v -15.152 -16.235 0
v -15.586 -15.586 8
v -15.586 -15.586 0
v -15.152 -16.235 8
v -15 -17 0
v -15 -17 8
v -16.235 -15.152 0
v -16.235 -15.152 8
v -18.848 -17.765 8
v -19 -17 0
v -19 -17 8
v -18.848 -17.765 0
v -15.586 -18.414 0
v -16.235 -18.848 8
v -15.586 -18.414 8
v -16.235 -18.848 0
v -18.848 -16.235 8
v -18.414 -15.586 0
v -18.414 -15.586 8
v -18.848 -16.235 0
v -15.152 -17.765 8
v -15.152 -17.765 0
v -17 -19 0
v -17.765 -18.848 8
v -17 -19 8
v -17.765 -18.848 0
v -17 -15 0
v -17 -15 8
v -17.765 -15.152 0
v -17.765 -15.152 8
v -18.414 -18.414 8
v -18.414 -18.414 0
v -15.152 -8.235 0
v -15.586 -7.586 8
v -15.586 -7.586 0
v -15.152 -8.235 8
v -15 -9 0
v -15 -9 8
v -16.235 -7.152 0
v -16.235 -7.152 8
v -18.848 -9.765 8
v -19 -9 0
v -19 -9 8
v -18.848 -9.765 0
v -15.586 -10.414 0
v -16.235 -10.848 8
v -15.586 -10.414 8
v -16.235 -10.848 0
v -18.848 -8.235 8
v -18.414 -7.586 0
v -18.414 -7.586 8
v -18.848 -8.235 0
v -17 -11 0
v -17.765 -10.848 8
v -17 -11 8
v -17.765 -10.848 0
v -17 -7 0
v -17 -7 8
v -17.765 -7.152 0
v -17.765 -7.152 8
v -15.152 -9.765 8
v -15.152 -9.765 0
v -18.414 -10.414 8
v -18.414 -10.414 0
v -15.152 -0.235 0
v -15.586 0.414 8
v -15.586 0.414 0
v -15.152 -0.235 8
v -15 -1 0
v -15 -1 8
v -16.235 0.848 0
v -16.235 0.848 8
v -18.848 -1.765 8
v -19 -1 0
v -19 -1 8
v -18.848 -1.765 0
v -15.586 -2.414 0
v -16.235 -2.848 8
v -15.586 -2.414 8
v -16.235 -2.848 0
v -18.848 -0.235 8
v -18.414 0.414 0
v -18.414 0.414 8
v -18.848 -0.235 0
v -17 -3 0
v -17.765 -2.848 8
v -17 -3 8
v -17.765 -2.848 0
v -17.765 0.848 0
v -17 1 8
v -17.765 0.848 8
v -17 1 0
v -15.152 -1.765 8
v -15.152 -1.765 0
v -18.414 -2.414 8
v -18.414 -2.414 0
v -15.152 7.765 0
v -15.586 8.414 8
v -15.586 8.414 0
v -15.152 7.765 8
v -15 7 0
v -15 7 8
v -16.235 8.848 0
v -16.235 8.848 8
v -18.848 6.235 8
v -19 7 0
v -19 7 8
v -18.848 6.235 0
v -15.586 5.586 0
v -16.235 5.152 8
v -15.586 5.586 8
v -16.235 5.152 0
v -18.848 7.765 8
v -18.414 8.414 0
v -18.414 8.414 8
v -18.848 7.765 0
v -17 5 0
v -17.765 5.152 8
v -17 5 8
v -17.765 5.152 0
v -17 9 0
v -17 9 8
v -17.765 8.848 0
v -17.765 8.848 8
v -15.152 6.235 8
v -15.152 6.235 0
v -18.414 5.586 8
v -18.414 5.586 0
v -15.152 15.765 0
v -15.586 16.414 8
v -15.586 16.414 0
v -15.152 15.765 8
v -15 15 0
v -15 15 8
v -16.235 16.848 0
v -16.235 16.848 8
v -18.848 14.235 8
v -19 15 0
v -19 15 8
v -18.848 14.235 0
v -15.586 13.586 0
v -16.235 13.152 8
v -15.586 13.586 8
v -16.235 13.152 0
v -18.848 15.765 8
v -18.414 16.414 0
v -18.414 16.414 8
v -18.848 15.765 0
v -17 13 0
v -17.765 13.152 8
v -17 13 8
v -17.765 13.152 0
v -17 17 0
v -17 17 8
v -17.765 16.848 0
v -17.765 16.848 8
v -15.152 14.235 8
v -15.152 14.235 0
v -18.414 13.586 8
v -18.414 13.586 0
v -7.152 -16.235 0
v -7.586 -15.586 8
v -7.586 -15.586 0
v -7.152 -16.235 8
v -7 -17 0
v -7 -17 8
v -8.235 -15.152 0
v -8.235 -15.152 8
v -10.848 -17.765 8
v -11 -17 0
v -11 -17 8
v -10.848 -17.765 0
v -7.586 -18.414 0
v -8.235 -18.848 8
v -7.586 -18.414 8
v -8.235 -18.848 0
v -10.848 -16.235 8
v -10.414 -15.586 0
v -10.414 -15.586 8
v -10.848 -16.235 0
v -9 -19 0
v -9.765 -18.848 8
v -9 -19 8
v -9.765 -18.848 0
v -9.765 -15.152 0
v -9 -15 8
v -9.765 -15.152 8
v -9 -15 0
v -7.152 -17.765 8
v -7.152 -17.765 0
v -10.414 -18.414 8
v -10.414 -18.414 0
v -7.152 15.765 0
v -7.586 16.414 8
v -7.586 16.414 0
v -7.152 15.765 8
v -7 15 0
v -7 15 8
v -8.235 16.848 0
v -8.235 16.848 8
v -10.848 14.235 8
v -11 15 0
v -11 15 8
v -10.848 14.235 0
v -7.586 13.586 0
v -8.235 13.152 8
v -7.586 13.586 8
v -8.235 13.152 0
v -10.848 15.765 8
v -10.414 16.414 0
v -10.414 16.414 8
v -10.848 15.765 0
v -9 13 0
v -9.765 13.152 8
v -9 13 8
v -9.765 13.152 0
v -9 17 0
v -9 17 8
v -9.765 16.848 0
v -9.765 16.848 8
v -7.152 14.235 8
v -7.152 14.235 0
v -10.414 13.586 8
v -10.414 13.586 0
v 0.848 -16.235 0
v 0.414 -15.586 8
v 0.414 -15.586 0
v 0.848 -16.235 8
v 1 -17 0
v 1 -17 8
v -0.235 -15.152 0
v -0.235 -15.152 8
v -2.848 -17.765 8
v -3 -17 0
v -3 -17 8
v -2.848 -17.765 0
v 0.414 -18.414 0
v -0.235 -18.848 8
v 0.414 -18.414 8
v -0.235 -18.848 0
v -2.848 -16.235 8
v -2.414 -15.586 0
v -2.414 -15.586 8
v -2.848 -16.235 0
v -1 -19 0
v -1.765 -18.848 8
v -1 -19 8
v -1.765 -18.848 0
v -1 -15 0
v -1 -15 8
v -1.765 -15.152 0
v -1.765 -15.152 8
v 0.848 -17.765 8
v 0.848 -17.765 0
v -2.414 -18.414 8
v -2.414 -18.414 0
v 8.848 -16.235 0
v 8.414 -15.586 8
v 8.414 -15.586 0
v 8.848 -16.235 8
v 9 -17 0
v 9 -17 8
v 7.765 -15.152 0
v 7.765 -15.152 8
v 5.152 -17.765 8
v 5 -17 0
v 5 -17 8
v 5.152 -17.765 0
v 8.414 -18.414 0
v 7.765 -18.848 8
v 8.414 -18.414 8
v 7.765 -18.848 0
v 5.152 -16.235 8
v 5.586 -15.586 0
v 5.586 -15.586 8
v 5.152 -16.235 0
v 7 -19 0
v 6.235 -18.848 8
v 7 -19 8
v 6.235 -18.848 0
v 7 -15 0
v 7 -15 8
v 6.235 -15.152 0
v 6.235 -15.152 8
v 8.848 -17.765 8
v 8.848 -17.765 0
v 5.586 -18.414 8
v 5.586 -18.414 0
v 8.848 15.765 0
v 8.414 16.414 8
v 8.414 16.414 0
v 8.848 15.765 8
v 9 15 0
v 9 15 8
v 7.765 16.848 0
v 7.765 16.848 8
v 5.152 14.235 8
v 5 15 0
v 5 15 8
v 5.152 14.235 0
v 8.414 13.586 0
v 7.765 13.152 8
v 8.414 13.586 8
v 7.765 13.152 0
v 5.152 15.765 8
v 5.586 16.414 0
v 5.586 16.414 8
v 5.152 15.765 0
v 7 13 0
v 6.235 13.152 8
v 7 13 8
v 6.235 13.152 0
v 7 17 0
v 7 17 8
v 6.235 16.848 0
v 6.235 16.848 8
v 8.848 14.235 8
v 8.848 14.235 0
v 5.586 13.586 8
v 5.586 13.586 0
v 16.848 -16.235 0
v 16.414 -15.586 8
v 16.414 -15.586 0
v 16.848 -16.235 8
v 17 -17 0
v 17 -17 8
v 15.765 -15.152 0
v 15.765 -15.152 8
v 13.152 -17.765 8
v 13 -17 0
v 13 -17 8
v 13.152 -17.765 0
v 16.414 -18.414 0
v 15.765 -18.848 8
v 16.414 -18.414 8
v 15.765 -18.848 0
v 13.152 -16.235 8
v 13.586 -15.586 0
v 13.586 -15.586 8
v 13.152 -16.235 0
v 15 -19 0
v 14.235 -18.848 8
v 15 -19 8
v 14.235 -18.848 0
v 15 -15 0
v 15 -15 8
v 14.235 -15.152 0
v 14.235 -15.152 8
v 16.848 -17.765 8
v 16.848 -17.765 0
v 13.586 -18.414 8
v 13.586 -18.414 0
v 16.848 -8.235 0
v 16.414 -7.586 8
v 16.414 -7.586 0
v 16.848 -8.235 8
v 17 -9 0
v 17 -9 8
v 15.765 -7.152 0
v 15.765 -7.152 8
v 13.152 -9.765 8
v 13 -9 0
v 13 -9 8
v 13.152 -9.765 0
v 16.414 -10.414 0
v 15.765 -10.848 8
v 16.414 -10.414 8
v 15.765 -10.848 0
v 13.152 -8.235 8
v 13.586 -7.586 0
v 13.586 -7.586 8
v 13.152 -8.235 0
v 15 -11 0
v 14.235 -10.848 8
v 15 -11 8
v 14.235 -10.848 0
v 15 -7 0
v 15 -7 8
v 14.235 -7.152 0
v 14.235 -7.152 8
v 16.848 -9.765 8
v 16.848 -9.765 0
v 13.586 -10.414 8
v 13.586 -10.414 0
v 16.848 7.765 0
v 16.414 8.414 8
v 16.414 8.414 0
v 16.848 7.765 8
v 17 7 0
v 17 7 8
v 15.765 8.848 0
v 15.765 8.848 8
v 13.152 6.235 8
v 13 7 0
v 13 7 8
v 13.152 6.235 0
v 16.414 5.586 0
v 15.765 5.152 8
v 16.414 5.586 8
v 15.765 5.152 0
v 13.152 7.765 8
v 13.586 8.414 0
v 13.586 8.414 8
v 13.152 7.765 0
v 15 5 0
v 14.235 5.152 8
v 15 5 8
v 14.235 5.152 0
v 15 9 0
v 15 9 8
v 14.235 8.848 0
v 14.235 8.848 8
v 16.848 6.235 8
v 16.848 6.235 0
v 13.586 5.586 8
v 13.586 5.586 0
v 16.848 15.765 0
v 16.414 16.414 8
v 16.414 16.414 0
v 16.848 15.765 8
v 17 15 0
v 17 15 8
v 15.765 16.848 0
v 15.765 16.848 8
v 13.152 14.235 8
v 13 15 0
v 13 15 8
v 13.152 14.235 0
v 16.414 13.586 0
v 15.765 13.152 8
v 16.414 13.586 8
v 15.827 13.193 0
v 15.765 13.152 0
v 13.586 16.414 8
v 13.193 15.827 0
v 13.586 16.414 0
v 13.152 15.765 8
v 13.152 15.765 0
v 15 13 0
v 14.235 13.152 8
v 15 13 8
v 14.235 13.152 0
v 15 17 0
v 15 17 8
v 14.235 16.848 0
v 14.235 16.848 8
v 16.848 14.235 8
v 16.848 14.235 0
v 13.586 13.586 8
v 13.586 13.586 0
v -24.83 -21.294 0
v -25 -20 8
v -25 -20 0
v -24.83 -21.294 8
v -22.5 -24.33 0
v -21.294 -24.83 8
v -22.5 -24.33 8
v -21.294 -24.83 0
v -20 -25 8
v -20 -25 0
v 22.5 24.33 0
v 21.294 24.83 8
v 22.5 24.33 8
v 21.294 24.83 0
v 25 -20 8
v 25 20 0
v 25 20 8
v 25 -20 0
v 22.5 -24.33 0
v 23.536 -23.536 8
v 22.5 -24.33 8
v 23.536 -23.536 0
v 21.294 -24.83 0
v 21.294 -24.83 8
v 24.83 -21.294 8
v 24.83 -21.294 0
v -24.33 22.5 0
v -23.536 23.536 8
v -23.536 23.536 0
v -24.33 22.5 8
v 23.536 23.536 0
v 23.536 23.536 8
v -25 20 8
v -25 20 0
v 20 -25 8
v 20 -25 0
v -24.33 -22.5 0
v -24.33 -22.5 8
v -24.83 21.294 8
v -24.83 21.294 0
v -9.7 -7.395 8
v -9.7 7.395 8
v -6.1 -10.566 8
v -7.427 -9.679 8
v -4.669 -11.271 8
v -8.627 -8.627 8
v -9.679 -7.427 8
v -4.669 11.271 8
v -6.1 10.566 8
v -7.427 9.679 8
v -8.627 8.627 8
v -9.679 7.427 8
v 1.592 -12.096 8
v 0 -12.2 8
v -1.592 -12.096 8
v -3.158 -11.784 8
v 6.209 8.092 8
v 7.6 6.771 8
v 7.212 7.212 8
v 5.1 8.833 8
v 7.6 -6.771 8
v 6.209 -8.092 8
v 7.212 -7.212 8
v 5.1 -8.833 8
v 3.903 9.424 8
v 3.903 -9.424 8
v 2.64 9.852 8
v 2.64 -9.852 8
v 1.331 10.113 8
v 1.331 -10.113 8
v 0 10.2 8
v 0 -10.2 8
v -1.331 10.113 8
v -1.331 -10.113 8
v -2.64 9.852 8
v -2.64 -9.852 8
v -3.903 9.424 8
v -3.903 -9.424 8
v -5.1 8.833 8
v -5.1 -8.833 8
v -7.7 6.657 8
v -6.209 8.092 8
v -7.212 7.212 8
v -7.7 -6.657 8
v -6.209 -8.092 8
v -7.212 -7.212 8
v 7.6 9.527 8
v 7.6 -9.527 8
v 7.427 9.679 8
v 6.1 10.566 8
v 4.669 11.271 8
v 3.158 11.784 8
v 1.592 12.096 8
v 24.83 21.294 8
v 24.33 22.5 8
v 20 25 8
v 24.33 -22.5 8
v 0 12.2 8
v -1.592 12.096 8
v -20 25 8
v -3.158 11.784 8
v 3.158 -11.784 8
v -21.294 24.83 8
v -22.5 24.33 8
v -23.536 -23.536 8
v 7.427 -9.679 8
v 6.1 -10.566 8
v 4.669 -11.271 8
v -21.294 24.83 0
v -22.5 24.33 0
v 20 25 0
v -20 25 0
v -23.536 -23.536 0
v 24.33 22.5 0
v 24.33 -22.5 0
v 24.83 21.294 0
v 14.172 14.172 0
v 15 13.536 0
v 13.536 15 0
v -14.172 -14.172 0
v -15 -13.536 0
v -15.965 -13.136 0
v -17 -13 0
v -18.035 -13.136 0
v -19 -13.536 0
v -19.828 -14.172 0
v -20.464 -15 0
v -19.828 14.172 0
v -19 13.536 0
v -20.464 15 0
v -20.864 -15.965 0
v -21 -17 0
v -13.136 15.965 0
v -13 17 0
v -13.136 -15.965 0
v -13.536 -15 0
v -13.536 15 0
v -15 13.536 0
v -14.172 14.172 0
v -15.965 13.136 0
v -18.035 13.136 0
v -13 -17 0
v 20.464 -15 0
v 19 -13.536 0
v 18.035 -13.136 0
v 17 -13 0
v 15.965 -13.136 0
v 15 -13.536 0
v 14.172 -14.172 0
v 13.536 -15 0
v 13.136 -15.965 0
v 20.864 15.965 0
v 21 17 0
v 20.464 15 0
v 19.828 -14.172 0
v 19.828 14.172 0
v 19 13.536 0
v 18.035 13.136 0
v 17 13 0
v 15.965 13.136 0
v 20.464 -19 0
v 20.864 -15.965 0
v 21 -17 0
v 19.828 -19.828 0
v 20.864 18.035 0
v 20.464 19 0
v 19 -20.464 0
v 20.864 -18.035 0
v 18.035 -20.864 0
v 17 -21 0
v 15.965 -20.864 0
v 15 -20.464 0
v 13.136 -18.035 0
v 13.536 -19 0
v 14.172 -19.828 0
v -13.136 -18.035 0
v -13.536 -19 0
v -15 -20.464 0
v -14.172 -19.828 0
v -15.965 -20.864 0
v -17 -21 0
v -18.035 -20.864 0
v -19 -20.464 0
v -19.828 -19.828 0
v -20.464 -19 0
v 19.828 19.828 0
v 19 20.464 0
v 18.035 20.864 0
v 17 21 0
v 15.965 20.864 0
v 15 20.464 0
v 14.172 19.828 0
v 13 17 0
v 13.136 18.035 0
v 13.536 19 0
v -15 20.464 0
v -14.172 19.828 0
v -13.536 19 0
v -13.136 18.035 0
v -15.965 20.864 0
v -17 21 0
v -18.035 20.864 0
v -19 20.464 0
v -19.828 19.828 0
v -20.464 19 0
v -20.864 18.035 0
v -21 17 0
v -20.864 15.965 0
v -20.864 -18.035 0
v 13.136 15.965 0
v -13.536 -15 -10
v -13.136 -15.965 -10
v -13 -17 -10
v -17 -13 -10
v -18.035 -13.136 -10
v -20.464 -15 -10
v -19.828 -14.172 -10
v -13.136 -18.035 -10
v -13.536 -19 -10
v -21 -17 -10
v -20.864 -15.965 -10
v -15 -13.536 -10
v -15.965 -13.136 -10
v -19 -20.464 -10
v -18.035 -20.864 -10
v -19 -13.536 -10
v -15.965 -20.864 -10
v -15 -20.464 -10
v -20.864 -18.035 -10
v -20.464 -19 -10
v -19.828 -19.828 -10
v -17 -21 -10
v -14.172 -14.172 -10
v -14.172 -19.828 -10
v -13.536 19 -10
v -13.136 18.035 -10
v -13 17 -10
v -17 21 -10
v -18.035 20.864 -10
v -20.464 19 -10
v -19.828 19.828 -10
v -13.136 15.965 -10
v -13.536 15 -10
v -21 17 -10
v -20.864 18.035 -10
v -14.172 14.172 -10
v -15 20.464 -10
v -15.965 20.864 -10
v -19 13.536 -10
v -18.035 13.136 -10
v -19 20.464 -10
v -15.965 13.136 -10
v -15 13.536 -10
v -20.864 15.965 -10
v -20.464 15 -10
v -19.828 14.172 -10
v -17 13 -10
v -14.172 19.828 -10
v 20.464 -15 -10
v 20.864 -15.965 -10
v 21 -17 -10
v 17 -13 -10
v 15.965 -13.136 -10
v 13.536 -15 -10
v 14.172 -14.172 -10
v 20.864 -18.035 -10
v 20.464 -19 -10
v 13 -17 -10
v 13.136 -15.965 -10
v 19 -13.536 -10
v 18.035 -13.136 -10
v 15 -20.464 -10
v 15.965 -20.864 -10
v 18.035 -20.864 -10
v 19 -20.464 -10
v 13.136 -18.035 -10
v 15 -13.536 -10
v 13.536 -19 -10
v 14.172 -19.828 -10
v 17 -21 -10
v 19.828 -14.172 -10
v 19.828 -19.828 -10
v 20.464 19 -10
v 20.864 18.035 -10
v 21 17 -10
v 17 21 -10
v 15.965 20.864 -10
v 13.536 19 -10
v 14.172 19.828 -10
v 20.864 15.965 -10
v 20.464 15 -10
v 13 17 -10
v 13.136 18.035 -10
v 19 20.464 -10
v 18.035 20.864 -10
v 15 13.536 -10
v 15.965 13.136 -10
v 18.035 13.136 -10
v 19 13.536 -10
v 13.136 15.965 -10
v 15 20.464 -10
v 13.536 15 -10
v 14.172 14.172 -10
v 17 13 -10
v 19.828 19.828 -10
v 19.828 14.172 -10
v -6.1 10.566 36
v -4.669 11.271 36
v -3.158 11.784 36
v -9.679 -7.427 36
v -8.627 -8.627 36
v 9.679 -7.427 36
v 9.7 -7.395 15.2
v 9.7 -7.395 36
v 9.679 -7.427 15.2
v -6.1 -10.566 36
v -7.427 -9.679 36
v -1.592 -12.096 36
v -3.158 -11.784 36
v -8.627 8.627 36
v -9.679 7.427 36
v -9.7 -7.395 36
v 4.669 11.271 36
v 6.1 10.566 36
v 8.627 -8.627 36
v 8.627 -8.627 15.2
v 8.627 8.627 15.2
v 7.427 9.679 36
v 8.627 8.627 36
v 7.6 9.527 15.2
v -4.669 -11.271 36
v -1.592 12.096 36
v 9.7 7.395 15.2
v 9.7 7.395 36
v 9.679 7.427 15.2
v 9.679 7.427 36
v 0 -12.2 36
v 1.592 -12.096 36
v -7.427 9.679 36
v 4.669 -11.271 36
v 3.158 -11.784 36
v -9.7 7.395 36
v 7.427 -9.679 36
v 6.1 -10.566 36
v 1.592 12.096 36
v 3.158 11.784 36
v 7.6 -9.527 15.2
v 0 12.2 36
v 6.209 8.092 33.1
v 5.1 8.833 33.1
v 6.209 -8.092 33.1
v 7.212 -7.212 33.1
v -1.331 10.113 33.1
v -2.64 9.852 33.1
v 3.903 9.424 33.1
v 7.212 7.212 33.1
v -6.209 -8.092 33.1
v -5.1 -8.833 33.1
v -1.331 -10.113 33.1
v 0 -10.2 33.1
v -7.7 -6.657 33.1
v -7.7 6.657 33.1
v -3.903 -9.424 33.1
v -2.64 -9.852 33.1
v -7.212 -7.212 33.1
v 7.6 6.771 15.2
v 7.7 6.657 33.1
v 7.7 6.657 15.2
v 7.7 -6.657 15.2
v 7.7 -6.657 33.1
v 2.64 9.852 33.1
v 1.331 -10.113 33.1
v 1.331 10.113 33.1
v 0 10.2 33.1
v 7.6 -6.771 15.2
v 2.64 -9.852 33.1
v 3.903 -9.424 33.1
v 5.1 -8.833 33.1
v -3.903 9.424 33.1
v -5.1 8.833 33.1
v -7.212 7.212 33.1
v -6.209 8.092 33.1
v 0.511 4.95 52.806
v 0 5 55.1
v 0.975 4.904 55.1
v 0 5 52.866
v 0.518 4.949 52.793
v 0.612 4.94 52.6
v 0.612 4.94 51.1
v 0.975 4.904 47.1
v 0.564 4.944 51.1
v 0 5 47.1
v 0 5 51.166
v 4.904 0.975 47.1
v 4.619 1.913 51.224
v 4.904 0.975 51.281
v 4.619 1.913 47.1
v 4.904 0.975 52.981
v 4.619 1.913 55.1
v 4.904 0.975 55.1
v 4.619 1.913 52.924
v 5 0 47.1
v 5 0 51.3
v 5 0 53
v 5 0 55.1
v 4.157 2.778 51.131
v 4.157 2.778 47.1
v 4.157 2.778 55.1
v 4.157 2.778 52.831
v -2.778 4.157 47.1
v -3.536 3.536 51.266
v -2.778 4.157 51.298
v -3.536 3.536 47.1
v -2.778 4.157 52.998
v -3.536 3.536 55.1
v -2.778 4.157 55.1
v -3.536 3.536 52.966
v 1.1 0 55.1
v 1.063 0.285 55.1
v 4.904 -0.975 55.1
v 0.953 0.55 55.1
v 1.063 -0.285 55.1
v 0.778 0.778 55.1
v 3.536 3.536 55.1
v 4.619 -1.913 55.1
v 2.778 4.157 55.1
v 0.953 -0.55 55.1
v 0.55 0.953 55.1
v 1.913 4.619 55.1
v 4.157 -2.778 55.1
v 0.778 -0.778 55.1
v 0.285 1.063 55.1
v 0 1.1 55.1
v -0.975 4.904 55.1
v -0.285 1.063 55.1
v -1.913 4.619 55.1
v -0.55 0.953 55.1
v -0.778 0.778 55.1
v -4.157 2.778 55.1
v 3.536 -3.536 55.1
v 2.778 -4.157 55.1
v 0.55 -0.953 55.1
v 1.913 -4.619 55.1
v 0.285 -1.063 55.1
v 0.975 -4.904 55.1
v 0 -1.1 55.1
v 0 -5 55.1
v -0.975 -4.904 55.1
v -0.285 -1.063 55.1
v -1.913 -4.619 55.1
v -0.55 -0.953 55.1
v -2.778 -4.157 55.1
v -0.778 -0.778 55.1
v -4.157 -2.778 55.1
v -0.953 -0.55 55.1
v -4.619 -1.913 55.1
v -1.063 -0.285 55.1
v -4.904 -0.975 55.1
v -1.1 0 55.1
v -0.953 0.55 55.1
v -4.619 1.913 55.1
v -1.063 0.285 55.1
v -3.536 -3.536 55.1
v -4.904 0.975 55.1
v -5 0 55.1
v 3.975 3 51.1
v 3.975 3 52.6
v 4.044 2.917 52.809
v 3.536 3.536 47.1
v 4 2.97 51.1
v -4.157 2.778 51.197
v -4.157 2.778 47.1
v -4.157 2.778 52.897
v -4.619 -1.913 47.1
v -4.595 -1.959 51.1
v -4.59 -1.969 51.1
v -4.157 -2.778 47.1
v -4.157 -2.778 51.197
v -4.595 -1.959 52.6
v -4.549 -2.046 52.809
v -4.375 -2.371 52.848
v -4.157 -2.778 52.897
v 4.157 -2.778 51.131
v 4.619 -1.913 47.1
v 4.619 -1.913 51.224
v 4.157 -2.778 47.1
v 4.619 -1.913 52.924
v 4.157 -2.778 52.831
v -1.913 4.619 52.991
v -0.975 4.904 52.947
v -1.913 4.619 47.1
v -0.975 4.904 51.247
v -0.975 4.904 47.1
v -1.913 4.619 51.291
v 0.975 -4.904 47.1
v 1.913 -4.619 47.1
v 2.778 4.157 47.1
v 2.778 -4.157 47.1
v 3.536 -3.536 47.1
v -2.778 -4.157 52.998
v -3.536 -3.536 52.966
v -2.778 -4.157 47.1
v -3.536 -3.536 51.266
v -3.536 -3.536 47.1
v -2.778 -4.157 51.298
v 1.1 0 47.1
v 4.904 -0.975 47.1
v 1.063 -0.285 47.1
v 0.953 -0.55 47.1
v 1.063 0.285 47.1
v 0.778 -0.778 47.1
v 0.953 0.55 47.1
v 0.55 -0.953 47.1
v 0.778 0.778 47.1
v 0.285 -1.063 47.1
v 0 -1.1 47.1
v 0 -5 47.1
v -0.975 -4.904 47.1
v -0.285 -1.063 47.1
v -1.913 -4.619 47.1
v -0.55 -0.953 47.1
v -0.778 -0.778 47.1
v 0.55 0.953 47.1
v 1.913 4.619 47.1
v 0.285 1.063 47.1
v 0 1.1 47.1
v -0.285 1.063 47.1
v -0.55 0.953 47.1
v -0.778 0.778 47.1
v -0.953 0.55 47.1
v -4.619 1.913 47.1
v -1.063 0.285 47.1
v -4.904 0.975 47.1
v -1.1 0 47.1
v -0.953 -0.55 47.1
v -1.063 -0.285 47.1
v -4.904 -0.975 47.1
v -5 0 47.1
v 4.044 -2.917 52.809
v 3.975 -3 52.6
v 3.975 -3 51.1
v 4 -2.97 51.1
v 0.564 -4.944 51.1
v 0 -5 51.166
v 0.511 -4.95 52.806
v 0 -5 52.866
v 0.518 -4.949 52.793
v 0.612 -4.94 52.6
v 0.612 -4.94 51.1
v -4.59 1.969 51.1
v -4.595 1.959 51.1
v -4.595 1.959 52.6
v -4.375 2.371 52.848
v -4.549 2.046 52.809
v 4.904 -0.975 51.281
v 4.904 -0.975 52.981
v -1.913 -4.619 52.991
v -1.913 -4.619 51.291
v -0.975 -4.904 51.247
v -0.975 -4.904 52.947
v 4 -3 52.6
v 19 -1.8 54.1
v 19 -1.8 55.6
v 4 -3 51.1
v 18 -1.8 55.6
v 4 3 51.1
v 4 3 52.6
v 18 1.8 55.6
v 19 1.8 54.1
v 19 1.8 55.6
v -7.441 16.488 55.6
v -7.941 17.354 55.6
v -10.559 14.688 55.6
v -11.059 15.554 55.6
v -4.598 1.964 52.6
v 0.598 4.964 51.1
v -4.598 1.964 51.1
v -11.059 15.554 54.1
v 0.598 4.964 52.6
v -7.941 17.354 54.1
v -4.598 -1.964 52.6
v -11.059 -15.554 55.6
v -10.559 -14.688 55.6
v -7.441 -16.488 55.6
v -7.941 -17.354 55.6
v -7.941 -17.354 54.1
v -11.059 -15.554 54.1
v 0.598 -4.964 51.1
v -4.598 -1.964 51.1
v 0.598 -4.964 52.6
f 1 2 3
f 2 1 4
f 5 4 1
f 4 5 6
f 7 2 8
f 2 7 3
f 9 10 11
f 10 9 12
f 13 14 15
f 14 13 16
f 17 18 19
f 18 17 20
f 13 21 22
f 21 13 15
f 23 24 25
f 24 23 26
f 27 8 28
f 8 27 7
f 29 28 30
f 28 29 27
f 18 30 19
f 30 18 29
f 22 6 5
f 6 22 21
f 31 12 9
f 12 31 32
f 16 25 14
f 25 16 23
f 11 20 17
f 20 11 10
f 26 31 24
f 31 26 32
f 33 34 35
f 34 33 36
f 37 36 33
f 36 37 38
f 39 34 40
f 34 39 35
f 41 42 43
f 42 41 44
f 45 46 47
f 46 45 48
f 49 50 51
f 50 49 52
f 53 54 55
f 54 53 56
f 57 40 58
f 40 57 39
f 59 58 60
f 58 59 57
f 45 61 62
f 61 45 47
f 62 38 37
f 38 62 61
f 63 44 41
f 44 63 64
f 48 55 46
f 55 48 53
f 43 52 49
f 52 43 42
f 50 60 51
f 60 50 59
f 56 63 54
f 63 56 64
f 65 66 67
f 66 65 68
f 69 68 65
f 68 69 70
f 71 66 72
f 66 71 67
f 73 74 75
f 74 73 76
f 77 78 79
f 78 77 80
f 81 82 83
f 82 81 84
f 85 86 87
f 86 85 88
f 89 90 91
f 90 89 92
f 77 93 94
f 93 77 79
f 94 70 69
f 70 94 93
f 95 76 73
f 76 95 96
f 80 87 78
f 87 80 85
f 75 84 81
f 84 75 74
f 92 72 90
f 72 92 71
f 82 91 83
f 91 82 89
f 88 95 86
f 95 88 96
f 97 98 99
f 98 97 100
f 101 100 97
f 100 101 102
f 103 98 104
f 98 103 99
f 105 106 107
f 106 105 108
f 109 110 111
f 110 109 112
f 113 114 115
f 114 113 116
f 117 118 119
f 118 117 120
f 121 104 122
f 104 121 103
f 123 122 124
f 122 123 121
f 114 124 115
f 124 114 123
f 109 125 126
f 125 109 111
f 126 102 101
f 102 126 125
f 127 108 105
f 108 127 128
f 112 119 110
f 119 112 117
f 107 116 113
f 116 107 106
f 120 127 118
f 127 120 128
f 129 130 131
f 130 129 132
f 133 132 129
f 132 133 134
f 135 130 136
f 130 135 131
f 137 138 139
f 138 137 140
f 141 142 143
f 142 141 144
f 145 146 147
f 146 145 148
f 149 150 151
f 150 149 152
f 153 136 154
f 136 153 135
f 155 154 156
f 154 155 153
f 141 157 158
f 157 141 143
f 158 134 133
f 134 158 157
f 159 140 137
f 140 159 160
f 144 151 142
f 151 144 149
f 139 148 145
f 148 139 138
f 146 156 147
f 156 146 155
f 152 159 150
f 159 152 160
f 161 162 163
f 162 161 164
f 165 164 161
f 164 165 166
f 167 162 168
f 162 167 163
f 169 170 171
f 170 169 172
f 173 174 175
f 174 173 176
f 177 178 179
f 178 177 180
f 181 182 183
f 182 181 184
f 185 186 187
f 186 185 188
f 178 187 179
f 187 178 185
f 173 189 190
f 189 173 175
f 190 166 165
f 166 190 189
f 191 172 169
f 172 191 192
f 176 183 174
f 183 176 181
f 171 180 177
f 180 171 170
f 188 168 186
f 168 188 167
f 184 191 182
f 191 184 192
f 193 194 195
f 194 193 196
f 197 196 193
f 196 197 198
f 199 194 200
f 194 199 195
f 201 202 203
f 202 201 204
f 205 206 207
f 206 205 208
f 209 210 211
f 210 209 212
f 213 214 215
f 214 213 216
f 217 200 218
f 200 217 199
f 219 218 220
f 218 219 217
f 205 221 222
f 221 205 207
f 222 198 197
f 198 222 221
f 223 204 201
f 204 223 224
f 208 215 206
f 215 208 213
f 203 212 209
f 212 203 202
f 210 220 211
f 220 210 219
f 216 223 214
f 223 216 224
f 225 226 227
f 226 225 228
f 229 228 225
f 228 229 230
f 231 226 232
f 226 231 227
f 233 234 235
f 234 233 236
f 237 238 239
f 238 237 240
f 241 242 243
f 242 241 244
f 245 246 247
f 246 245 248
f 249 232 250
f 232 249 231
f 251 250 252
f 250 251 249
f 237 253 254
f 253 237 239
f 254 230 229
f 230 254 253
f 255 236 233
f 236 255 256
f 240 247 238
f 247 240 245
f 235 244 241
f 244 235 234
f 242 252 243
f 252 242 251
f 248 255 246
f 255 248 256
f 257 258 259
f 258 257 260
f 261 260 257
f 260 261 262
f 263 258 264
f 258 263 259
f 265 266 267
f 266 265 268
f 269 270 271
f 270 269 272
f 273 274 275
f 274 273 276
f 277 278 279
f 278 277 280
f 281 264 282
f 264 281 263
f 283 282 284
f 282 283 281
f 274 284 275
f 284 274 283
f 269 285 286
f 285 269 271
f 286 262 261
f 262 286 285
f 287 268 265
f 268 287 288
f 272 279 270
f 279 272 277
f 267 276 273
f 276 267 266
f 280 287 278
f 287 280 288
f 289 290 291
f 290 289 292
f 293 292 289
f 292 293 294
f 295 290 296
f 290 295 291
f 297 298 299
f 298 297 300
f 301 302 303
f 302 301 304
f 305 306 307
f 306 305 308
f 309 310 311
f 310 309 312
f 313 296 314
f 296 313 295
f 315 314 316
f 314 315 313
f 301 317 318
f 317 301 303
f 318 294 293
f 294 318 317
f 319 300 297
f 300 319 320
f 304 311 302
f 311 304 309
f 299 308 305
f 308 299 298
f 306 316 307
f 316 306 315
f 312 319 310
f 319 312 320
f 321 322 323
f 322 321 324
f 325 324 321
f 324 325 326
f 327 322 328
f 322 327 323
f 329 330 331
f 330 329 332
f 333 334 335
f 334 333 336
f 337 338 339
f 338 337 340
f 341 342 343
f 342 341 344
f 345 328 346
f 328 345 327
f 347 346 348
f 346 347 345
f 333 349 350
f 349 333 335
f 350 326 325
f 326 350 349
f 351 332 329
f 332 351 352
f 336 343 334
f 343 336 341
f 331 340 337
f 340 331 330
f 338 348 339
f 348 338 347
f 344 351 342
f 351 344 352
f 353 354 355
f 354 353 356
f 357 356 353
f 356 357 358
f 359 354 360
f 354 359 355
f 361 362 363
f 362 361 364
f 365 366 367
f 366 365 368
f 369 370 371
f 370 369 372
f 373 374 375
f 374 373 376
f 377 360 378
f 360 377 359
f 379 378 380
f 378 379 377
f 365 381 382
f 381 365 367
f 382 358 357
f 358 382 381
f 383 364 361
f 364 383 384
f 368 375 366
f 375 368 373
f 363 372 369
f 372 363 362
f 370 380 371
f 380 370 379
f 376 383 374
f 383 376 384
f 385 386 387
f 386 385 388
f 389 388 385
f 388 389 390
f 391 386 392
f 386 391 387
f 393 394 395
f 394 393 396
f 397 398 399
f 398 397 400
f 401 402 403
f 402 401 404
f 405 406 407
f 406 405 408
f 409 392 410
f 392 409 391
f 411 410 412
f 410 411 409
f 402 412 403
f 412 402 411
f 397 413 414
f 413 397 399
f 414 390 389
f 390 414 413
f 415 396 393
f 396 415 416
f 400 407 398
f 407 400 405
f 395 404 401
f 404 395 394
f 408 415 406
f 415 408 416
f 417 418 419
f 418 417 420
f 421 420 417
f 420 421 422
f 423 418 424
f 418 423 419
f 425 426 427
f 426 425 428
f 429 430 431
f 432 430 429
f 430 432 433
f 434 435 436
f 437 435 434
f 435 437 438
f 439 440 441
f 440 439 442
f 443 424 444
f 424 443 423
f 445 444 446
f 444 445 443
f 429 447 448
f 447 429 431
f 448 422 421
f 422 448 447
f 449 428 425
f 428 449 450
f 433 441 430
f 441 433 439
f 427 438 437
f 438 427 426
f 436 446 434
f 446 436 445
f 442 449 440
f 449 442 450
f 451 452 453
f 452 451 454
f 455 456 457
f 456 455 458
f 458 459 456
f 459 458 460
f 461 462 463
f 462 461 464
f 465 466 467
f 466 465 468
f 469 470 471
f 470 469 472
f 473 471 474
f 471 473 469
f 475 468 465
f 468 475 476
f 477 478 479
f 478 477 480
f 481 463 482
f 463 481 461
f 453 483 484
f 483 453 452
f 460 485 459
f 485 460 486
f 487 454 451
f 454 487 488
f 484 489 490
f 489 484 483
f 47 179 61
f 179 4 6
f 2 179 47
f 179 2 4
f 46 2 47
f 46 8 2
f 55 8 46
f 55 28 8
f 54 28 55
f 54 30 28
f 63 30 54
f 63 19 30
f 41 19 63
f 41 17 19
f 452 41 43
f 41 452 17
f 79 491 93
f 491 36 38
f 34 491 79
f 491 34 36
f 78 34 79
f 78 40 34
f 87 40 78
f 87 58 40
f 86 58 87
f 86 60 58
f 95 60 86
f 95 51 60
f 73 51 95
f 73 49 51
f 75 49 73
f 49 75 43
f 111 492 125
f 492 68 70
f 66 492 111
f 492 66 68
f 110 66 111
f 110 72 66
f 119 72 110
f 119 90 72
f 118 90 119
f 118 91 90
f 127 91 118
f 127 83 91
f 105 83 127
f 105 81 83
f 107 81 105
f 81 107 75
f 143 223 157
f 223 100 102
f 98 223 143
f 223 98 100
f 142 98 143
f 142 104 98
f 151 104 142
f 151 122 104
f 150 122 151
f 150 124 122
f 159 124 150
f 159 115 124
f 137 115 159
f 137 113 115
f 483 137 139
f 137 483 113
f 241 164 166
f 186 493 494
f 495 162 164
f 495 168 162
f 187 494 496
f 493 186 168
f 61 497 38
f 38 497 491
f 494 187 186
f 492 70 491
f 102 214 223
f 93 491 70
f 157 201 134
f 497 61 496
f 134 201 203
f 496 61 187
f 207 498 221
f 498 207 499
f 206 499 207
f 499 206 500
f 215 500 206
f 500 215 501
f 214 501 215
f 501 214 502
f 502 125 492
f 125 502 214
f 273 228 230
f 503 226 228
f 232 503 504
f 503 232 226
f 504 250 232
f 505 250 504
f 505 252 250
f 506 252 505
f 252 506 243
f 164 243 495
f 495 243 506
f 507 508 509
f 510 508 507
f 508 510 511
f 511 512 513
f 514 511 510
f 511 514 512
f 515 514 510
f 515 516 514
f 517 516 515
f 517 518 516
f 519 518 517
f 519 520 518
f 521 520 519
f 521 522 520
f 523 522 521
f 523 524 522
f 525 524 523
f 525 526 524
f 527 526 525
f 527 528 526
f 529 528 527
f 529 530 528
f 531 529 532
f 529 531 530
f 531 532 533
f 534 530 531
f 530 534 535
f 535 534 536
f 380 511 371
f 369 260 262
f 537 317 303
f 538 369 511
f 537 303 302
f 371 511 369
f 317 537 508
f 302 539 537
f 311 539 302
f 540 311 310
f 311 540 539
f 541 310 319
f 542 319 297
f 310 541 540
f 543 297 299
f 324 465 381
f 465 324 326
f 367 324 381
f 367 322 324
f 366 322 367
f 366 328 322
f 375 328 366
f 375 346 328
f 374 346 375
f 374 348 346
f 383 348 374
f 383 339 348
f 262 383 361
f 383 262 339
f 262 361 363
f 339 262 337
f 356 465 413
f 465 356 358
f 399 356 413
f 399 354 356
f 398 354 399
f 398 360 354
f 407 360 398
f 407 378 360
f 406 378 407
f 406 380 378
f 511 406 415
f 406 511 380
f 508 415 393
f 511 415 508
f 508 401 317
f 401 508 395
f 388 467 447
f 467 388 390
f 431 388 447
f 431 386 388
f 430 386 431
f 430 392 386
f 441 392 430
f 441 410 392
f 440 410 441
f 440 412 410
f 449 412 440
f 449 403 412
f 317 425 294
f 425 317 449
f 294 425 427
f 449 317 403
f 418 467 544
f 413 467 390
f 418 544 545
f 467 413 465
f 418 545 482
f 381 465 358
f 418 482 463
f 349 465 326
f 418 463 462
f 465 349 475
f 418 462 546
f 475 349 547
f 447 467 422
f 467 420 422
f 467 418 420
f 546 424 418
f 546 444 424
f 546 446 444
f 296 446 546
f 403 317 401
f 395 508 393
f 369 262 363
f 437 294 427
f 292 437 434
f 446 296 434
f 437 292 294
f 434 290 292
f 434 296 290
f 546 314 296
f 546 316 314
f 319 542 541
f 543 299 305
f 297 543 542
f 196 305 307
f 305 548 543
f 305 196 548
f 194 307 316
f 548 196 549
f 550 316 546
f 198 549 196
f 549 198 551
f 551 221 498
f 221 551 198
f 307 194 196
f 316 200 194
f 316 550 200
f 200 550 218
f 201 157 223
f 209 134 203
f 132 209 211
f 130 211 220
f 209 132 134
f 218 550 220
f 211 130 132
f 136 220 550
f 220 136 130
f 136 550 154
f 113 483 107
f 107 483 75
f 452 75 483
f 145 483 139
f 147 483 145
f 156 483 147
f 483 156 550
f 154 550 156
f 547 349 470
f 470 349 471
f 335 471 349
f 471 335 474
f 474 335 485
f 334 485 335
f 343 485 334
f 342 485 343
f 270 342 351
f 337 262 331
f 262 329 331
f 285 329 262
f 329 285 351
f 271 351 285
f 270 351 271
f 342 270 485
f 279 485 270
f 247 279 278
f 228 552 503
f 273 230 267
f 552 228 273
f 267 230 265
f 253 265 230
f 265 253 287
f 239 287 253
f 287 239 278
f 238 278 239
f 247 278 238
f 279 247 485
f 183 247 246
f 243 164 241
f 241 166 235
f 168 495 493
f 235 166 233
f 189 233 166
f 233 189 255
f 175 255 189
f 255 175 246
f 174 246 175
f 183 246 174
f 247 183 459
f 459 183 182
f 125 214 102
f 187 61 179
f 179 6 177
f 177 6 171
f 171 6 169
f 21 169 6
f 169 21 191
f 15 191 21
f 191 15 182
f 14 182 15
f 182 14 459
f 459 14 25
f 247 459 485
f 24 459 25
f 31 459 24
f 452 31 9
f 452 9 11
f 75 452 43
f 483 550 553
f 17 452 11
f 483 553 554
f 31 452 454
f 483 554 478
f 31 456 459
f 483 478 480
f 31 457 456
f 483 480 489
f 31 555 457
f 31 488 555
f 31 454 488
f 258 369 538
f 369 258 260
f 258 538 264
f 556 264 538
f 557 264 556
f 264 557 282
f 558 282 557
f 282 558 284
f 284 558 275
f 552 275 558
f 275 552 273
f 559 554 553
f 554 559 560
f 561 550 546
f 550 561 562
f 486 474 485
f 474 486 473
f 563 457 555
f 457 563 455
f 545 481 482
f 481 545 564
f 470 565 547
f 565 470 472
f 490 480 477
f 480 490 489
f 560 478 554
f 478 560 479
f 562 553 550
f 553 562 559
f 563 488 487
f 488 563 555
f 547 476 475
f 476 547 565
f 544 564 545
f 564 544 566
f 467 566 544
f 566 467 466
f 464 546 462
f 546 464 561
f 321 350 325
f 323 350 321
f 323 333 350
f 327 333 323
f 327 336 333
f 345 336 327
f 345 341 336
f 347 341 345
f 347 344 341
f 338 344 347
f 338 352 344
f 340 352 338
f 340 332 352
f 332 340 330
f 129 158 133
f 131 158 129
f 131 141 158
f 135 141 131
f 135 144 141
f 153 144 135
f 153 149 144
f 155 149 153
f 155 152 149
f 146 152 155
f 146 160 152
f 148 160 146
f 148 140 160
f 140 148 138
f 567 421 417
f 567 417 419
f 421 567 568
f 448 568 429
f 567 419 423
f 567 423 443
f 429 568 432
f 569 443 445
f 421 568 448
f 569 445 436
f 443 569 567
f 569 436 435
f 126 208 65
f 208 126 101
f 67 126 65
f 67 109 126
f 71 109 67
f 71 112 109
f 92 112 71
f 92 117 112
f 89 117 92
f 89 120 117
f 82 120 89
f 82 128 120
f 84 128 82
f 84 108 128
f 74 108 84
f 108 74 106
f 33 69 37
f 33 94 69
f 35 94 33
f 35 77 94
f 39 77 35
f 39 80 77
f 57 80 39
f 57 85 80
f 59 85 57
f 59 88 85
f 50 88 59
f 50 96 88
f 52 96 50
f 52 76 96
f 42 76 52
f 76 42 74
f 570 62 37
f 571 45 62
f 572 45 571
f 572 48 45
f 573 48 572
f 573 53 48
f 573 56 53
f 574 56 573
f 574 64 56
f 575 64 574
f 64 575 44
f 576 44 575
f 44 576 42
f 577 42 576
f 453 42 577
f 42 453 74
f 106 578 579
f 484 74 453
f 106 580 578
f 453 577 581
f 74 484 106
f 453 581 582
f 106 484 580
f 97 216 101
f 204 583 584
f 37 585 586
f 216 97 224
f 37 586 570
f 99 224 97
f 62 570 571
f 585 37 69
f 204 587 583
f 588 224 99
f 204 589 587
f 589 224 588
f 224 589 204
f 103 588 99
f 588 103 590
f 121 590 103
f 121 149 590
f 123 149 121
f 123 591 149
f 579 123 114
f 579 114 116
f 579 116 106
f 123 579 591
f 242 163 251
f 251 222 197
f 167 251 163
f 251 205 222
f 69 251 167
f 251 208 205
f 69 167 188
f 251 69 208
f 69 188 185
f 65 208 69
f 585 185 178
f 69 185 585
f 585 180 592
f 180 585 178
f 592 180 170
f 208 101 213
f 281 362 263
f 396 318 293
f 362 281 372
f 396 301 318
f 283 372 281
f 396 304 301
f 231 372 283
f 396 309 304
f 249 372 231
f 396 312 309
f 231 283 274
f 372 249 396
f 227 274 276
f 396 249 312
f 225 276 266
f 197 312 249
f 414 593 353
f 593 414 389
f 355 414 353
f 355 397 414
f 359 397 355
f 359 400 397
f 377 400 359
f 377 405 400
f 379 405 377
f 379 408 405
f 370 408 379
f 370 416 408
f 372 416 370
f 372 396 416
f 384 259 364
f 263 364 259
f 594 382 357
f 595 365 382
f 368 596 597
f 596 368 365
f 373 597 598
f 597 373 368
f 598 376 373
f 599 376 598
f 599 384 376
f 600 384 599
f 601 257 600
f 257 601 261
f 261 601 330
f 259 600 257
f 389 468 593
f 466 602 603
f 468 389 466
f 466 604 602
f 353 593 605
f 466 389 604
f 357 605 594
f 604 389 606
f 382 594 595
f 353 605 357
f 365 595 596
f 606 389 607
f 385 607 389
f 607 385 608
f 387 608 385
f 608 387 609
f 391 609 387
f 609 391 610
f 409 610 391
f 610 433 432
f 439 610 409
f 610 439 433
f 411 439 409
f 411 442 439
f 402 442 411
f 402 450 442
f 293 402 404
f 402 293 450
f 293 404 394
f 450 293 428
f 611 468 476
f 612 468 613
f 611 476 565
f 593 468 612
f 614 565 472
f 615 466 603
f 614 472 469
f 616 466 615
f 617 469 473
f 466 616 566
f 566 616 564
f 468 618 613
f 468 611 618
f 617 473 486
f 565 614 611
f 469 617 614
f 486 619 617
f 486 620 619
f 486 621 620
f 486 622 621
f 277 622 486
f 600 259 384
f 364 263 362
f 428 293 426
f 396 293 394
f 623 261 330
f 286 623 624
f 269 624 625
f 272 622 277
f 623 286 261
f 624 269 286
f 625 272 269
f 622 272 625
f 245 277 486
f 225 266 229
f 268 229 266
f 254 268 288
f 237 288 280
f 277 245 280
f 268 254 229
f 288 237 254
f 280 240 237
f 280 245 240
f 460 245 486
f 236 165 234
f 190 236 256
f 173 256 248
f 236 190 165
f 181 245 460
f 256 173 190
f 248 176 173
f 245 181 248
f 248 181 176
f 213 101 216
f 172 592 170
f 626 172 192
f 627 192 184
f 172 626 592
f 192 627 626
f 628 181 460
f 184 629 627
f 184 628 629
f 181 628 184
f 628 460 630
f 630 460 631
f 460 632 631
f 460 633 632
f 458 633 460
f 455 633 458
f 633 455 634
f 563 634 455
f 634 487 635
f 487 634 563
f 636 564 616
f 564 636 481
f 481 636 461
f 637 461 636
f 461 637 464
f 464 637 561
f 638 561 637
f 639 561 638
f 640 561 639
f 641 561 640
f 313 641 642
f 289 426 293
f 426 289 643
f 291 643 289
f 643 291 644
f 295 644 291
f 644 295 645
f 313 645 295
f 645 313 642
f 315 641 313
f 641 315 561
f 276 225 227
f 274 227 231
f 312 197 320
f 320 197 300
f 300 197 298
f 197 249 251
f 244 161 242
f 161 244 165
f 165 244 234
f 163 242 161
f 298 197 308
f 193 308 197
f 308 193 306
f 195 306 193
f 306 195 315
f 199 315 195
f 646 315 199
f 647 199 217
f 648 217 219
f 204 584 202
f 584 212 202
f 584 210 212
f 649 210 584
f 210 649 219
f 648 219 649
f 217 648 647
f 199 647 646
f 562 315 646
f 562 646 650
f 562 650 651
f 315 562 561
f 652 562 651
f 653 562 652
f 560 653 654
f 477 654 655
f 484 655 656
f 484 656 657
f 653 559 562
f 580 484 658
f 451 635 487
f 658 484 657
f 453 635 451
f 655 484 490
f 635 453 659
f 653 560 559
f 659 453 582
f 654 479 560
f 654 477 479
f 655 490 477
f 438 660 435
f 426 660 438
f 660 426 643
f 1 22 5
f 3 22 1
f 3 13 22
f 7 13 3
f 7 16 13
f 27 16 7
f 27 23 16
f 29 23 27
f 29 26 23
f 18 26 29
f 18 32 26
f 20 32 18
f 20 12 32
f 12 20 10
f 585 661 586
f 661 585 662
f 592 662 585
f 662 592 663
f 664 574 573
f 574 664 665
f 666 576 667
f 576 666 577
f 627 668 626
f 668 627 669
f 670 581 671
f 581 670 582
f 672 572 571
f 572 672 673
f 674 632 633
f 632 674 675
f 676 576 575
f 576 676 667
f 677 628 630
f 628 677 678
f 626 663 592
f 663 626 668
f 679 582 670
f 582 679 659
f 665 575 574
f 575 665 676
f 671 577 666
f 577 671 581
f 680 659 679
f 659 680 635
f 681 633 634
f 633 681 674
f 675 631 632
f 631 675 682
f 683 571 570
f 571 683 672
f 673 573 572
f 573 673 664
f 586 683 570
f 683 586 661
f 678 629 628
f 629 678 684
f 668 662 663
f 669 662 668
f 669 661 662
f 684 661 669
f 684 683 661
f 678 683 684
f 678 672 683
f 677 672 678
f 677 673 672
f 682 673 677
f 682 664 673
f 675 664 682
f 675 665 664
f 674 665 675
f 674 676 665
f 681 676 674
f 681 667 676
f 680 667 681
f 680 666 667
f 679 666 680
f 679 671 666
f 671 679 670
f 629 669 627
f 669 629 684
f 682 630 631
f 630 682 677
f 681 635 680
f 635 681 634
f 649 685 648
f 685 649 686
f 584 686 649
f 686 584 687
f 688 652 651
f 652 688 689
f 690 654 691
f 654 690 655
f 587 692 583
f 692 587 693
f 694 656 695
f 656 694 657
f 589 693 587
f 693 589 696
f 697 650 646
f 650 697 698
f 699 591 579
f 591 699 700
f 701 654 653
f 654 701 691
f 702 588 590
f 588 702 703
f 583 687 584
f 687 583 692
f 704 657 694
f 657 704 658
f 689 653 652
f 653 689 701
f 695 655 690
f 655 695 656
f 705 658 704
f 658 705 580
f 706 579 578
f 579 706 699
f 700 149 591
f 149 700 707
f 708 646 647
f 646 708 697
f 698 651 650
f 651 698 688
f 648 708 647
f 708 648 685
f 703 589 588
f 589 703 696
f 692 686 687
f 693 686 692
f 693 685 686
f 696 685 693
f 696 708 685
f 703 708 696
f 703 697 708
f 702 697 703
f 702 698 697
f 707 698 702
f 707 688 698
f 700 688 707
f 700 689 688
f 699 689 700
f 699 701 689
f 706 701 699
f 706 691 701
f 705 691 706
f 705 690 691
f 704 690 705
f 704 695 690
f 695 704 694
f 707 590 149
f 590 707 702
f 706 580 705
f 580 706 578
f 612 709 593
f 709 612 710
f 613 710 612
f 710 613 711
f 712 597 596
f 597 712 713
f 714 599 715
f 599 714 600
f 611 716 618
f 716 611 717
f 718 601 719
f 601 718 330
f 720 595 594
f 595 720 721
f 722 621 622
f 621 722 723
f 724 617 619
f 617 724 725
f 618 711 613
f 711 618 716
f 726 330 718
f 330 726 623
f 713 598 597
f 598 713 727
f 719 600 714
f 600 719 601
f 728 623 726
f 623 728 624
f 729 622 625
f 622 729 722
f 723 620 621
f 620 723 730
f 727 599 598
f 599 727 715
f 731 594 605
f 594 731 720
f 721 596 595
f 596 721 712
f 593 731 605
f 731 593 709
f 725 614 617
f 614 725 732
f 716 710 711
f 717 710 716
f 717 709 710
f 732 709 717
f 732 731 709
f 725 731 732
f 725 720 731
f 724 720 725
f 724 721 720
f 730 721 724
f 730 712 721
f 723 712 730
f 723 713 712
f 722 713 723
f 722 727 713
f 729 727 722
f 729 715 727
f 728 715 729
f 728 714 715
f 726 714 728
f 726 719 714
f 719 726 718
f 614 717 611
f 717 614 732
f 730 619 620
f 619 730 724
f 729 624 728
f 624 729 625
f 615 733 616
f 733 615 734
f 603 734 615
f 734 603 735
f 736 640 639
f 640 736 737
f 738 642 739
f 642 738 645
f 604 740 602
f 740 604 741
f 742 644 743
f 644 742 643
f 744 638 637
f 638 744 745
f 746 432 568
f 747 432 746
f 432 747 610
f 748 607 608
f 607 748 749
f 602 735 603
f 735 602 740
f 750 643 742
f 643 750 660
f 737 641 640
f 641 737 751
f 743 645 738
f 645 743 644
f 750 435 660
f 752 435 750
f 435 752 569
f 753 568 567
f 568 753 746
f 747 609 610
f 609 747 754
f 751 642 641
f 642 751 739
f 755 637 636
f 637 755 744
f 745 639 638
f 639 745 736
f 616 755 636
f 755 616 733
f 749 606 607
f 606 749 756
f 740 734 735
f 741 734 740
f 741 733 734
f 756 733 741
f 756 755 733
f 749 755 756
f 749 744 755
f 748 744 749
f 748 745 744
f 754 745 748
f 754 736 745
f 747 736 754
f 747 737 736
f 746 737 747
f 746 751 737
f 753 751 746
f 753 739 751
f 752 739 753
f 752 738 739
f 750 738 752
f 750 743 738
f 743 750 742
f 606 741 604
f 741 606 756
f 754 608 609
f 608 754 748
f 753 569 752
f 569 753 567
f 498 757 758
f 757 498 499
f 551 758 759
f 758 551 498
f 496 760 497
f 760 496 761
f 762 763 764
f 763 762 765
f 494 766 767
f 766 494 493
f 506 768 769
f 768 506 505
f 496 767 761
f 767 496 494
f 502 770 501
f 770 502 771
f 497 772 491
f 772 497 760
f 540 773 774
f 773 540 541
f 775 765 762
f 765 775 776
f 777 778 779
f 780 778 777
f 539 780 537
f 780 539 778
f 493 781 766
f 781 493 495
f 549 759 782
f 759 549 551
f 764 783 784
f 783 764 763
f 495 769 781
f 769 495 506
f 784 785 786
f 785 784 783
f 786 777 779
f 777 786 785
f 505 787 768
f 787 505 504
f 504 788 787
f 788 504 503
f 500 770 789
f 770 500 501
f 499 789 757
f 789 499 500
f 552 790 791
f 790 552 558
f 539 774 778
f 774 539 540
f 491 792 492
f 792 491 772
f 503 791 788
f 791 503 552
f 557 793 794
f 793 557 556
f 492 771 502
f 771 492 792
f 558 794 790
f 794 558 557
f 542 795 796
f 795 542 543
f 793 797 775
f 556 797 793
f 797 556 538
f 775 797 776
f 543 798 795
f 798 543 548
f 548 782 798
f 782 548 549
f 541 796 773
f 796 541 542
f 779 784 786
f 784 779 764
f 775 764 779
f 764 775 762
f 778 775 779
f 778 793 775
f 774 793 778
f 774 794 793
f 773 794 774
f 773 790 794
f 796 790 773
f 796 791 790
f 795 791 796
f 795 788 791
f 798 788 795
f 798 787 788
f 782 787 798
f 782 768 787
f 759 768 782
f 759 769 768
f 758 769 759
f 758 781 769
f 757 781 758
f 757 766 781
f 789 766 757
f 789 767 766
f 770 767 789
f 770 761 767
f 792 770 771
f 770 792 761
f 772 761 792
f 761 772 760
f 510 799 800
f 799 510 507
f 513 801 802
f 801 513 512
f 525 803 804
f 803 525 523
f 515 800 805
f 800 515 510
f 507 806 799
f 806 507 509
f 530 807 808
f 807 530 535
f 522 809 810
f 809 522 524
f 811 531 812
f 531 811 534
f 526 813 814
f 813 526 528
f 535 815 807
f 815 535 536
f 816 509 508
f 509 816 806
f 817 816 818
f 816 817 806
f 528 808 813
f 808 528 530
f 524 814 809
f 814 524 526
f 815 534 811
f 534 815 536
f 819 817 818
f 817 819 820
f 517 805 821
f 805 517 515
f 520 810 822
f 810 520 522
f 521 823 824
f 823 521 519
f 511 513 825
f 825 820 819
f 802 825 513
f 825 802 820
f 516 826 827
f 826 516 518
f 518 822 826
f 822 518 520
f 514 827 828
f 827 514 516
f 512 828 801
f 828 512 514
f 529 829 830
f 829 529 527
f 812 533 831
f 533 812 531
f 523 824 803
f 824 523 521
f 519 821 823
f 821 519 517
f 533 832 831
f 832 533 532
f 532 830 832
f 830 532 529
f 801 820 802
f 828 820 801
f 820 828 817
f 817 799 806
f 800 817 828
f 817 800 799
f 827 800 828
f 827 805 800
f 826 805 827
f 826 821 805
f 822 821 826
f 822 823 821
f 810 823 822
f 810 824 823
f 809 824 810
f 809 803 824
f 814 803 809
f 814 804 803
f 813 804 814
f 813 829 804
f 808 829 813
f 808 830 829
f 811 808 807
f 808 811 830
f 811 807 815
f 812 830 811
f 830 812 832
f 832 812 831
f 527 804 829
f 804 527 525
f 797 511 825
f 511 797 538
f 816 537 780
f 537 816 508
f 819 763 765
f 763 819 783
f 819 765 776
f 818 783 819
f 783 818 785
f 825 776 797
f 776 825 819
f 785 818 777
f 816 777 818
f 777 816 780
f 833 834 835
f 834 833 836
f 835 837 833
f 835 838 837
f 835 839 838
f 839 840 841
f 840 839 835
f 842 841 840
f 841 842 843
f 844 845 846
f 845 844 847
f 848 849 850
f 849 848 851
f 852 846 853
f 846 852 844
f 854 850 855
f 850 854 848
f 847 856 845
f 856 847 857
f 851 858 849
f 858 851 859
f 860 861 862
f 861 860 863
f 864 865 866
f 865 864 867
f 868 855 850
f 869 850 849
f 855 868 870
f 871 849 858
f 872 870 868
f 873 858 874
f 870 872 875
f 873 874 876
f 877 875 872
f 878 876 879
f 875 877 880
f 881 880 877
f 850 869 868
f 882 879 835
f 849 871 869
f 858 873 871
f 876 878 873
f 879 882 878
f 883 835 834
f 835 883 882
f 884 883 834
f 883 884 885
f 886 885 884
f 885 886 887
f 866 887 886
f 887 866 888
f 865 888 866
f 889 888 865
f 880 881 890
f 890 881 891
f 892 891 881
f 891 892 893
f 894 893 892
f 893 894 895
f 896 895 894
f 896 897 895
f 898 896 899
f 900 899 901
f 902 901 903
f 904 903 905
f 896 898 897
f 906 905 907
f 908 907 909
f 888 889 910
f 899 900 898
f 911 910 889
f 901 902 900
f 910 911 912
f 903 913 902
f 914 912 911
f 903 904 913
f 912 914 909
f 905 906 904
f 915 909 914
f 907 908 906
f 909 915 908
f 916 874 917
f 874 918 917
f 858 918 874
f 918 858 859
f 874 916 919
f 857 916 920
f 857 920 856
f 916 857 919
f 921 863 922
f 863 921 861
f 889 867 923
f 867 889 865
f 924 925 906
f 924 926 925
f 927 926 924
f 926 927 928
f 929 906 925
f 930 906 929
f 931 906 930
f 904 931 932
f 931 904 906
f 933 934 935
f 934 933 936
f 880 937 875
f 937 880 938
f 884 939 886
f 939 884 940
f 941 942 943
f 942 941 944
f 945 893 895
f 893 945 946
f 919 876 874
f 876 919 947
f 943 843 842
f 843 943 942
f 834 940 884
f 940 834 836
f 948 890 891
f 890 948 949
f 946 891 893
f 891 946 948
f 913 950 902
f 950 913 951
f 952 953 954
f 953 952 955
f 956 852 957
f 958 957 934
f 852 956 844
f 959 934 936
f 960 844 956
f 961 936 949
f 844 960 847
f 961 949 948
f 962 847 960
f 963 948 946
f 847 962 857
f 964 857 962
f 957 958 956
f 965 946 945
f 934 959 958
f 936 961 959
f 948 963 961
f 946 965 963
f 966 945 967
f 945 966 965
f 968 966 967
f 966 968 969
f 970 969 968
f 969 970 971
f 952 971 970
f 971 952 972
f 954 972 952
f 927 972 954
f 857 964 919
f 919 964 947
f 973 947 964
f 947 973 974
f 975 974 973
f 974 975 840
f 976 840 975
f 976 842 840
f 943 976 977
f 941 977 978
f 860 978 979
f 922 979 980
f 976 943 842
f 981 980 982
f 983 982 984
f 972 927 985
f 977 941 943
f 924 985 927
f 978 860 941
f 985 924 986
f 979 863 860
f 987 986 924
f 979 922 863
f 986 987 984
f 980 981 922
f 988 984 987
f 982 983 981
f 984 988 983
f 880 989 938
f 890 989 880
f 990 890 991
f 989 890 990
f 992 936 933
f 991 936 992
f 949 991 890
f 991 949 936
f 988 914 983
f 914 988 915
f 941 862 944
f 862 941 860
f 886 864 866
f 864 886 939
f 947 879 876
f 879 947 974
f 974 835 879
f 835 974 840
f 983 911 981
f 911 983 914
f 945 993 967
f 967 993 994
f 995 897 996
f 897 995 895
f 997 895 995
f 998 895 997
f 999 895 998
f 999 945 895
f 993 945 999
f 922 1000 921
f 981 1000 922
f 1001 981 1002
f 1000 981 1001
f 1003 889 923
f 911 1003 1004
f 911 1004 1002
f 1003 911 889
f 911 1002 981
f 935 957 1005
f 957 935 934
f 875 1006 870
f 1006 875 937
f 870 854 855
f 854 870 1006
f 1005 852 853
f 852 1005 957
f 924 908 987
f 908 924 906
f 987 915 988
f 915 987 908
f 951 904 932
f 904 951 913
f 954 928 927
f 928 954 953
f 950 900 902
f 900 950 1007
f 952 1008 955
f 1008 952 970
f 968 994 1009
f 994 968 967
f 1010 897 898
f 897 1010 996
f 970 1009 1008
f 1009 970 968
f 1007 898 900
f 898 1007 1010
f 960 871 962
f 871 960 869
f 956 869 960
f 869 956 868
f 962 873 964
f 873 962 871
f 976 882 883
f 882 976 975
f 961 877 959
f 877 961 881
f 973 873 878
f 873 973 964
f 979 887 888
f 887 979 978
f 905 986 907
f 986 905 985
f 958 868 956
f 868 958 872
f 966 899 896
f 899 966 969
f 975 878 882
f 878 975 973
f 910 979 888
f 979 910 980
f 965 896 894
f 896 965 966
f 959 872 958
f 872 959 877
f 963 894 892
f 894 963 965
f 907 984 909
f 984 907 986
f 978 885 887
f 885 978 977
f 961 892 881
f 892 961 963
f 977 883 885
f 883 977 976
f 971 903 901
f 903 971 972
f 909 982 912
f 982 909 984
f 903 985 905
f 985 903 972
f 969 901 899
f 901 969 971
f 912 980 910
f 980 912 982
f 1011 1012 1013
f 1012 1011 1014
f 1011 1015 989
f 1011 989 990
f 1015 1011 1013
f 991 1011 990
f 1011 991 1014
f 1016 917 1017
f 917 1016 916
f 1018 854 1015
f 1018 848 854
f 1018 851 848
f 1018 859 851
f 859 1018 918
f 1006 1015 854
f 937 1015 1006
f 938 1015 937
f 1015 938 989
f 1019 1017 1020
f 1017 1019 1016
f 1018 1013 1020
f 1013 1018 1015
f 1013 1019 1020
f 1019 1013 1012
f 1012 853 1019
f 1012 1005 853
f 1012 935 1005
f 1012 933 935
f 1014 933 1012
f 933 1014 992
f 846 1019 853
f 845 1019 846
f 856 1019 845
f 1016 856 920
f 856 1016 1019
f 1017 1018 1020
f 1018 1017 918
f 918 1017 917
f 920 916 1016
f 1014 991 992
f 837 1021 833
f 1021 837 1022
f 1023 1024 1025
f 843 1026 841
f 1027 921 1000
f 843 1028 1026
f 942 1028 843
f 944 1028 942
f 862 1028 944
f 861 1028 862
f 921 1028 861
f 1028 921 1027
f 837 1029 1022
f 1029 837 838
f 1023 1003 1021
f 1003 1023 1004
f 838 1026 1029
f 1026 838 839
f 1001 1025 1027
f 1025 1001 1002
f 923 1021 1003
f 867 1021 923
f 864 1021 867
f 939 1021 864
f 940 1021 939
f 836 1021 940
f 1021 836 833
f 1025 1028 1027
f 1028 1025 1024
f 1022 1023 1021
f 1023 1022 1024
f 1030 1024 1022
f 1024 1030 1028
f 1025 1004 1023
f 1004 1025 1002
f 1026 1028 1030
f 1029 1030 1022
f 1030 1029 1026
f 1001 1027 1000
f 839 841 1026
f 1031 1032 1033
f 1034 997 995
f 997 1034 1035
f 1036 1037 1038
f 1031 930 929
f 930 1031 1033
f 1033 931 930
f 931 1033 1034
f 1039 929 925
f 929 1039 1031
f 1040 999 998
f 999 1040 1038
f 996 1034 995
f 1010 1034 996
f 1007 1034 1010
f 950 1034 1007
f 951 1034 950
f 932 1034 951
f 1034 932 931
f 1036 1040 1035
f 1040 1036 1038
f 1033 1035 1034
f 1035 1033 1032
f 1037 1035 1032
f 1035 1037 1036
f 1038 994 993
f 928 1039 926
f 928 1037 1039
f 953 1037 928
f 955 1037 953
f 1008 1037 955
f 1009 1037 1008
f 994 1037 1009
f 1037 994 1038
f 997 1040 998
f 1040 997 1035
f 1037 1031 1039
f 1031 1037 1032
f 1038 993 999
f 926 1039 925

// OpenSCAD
// FA-130 Small Fan Demo
// FA-130 小型ファンデモ
//
// プロペラ付き小型送風機の例
//
// 外形: 約 50mm x 50mm x 50mm
// 使用モーター: FA-130 x1
//
// ビルド:
//   openscad --enable=lazy-union -O export-3mf/material-type=color \
//     -o fa130_fan_demo.3mf fa130_fan_demo.scad

include <../mabuchi_motor.scad>

// ===== Customizer パラメータ =====

/* [表示設定] */
// モーターモデルを表示（フィットチェック用）
show_motor = false;

// プロペラを表示
show_propeller = true;

// スタンドを表示
show_stand = true;

// マウントを表示
show_mount = true;

/* [ファン設定] */
// プロペラ直径
propeller_d = 40; // [30:5:60]

// プロペラ羽根数
blade_count = 3; // [2:1:6]

// シャフト穴クリアランス
shaft_tolerance = 0.2; // [0.1:0.1:0.5]

/* [マウント設定] */
// 嵌合クリアランス
tolerance = 0.3; // [0.1:0.05:0.5]

// 壁厚
wall = 2; // [1.5:0.5:3]

// ベース厚
base = 3; // [2:1:5]

// ===== 定数 =====

// マウント外形（外部定数から計算）
mount_outer_d = fa130_housing_d + tolerance + wall * 2;
mount_outer_h = fa130_housing_h + tolerance + wall * 2;
mount_len = fa130_body_len + base;

// スタンド寸法
stand_w = 50;
stand_d = 50;
stand_h = 8;
leg_h = 10;

// ===== モジュール =====

// プロペラ
module propeller(d = 40, blades = 3, hub_d = 10, hub_h = 8, shaft_tolerance = 0.2) {
    blade_w = d * 0.15;
    blade_t = 1.5;

    // ハブ
    difference() {
        cylinder(h = hub_h, d = hub_d, $fn = 32);
        // シャフト穴
        translate([0, 0, -0.1])
            cylinder(h = hub_h + 0.2, d = fa130_shaft_d + shaft_tolerance, $fn = 24);
    }

    // 羽根
    for (i = [0:blades-1]) {
        rotate([0, 0, i * 360 / blades])
            translate([hub_d/2 - 2, -blade_w/2, hub_h/2])
                hull() {
                    cube([1, blade_w, blade_t]);
                    translate([d/2 - hub_d/2, blade_w * 0.2, 3])
                        cube([1, blade_w * 0.6, blade_t]);
                }
    }
}

// ファンスタンド（脚付き）
module fan_stand() {
    // ベースプレート
    difference() {
        // 角丸の台座
        hull() {
            for (x = [5, stand_w - 5], y = [5, stand_d - 5]) {
                translate([x, y, 0])
                    cylinder(h = stand_h, r = 5, $fn = 24);
            }
        }

        // 通気穴（格子状）
        hole_spacing = 8;
        hole_d = 4;
        for (x = [hole_spacing : hole_spacing : stand_w - hole_spacing],
             y = [hole_spacing : hole_spacing : stand_d - hole_spacing]) {
            // マウント領域を避ける
            if (sqrt(pow(x - stand_w/2, 2) + pow(y - stand_d/2, 2)) > mount_outer_d/2 + 3) {
                translate([x, y, -0.1])
                    cylinder(h = stand_h + 0.2, d = hole_d, $fn = 16);
            }
        }
    }

    // 脚（4隅）
    for (x = [8, stand_w - 8], y = [8, stand_d - 8]) {
        translate([x, y, -leg_h])
            cylinder(h = leg_h, d = 8, $fn = 24);
    }
}

// ===== 組み立て =====

// スタンド
if (show_stand) {
    color("white")
    translate([-stand_w/2, -stand_d/2, 0])
        fan_stand();
}

// モーターマウント（スタンド上に配置、シャフト上向き）
// rotate([0, 90, 0]) でシャフト側（X=0）が上になる
if (show_mount) {
    color("white")
    translate([0, 0, stand_h + mount_len])
        rotate([0, 90, 0])
            mabuchi_motor_fa130_mount(wall = wall, base = base, tolerance = tolerance,
                                       anchor = "motor");
}

// フィットチェック用モーター（マウントと同じ変換を適用）
if (show_motor) {
    translate([0, 0, stand_h + mount_len])
        rotate([0, 90, 0])
            mabuchi_motor_fa130_in_mount(base = base);
}

// プロペラ
if (show_propeller) {
    // show_mount=true: 組み立て位置、false: 印刷用（Z=0）
    shaft_tip_z = show_mount ? stand_h + mount_len + fa130_shaft_protrusion + fa130_bearing_holder_len : 0;

    color("lightblue")
    translate([0, 0, shaft_tip_z])
        propeller(d = propeller_d, blades = blade_count, shaft_tolerance = shaft_tolerance);
}
